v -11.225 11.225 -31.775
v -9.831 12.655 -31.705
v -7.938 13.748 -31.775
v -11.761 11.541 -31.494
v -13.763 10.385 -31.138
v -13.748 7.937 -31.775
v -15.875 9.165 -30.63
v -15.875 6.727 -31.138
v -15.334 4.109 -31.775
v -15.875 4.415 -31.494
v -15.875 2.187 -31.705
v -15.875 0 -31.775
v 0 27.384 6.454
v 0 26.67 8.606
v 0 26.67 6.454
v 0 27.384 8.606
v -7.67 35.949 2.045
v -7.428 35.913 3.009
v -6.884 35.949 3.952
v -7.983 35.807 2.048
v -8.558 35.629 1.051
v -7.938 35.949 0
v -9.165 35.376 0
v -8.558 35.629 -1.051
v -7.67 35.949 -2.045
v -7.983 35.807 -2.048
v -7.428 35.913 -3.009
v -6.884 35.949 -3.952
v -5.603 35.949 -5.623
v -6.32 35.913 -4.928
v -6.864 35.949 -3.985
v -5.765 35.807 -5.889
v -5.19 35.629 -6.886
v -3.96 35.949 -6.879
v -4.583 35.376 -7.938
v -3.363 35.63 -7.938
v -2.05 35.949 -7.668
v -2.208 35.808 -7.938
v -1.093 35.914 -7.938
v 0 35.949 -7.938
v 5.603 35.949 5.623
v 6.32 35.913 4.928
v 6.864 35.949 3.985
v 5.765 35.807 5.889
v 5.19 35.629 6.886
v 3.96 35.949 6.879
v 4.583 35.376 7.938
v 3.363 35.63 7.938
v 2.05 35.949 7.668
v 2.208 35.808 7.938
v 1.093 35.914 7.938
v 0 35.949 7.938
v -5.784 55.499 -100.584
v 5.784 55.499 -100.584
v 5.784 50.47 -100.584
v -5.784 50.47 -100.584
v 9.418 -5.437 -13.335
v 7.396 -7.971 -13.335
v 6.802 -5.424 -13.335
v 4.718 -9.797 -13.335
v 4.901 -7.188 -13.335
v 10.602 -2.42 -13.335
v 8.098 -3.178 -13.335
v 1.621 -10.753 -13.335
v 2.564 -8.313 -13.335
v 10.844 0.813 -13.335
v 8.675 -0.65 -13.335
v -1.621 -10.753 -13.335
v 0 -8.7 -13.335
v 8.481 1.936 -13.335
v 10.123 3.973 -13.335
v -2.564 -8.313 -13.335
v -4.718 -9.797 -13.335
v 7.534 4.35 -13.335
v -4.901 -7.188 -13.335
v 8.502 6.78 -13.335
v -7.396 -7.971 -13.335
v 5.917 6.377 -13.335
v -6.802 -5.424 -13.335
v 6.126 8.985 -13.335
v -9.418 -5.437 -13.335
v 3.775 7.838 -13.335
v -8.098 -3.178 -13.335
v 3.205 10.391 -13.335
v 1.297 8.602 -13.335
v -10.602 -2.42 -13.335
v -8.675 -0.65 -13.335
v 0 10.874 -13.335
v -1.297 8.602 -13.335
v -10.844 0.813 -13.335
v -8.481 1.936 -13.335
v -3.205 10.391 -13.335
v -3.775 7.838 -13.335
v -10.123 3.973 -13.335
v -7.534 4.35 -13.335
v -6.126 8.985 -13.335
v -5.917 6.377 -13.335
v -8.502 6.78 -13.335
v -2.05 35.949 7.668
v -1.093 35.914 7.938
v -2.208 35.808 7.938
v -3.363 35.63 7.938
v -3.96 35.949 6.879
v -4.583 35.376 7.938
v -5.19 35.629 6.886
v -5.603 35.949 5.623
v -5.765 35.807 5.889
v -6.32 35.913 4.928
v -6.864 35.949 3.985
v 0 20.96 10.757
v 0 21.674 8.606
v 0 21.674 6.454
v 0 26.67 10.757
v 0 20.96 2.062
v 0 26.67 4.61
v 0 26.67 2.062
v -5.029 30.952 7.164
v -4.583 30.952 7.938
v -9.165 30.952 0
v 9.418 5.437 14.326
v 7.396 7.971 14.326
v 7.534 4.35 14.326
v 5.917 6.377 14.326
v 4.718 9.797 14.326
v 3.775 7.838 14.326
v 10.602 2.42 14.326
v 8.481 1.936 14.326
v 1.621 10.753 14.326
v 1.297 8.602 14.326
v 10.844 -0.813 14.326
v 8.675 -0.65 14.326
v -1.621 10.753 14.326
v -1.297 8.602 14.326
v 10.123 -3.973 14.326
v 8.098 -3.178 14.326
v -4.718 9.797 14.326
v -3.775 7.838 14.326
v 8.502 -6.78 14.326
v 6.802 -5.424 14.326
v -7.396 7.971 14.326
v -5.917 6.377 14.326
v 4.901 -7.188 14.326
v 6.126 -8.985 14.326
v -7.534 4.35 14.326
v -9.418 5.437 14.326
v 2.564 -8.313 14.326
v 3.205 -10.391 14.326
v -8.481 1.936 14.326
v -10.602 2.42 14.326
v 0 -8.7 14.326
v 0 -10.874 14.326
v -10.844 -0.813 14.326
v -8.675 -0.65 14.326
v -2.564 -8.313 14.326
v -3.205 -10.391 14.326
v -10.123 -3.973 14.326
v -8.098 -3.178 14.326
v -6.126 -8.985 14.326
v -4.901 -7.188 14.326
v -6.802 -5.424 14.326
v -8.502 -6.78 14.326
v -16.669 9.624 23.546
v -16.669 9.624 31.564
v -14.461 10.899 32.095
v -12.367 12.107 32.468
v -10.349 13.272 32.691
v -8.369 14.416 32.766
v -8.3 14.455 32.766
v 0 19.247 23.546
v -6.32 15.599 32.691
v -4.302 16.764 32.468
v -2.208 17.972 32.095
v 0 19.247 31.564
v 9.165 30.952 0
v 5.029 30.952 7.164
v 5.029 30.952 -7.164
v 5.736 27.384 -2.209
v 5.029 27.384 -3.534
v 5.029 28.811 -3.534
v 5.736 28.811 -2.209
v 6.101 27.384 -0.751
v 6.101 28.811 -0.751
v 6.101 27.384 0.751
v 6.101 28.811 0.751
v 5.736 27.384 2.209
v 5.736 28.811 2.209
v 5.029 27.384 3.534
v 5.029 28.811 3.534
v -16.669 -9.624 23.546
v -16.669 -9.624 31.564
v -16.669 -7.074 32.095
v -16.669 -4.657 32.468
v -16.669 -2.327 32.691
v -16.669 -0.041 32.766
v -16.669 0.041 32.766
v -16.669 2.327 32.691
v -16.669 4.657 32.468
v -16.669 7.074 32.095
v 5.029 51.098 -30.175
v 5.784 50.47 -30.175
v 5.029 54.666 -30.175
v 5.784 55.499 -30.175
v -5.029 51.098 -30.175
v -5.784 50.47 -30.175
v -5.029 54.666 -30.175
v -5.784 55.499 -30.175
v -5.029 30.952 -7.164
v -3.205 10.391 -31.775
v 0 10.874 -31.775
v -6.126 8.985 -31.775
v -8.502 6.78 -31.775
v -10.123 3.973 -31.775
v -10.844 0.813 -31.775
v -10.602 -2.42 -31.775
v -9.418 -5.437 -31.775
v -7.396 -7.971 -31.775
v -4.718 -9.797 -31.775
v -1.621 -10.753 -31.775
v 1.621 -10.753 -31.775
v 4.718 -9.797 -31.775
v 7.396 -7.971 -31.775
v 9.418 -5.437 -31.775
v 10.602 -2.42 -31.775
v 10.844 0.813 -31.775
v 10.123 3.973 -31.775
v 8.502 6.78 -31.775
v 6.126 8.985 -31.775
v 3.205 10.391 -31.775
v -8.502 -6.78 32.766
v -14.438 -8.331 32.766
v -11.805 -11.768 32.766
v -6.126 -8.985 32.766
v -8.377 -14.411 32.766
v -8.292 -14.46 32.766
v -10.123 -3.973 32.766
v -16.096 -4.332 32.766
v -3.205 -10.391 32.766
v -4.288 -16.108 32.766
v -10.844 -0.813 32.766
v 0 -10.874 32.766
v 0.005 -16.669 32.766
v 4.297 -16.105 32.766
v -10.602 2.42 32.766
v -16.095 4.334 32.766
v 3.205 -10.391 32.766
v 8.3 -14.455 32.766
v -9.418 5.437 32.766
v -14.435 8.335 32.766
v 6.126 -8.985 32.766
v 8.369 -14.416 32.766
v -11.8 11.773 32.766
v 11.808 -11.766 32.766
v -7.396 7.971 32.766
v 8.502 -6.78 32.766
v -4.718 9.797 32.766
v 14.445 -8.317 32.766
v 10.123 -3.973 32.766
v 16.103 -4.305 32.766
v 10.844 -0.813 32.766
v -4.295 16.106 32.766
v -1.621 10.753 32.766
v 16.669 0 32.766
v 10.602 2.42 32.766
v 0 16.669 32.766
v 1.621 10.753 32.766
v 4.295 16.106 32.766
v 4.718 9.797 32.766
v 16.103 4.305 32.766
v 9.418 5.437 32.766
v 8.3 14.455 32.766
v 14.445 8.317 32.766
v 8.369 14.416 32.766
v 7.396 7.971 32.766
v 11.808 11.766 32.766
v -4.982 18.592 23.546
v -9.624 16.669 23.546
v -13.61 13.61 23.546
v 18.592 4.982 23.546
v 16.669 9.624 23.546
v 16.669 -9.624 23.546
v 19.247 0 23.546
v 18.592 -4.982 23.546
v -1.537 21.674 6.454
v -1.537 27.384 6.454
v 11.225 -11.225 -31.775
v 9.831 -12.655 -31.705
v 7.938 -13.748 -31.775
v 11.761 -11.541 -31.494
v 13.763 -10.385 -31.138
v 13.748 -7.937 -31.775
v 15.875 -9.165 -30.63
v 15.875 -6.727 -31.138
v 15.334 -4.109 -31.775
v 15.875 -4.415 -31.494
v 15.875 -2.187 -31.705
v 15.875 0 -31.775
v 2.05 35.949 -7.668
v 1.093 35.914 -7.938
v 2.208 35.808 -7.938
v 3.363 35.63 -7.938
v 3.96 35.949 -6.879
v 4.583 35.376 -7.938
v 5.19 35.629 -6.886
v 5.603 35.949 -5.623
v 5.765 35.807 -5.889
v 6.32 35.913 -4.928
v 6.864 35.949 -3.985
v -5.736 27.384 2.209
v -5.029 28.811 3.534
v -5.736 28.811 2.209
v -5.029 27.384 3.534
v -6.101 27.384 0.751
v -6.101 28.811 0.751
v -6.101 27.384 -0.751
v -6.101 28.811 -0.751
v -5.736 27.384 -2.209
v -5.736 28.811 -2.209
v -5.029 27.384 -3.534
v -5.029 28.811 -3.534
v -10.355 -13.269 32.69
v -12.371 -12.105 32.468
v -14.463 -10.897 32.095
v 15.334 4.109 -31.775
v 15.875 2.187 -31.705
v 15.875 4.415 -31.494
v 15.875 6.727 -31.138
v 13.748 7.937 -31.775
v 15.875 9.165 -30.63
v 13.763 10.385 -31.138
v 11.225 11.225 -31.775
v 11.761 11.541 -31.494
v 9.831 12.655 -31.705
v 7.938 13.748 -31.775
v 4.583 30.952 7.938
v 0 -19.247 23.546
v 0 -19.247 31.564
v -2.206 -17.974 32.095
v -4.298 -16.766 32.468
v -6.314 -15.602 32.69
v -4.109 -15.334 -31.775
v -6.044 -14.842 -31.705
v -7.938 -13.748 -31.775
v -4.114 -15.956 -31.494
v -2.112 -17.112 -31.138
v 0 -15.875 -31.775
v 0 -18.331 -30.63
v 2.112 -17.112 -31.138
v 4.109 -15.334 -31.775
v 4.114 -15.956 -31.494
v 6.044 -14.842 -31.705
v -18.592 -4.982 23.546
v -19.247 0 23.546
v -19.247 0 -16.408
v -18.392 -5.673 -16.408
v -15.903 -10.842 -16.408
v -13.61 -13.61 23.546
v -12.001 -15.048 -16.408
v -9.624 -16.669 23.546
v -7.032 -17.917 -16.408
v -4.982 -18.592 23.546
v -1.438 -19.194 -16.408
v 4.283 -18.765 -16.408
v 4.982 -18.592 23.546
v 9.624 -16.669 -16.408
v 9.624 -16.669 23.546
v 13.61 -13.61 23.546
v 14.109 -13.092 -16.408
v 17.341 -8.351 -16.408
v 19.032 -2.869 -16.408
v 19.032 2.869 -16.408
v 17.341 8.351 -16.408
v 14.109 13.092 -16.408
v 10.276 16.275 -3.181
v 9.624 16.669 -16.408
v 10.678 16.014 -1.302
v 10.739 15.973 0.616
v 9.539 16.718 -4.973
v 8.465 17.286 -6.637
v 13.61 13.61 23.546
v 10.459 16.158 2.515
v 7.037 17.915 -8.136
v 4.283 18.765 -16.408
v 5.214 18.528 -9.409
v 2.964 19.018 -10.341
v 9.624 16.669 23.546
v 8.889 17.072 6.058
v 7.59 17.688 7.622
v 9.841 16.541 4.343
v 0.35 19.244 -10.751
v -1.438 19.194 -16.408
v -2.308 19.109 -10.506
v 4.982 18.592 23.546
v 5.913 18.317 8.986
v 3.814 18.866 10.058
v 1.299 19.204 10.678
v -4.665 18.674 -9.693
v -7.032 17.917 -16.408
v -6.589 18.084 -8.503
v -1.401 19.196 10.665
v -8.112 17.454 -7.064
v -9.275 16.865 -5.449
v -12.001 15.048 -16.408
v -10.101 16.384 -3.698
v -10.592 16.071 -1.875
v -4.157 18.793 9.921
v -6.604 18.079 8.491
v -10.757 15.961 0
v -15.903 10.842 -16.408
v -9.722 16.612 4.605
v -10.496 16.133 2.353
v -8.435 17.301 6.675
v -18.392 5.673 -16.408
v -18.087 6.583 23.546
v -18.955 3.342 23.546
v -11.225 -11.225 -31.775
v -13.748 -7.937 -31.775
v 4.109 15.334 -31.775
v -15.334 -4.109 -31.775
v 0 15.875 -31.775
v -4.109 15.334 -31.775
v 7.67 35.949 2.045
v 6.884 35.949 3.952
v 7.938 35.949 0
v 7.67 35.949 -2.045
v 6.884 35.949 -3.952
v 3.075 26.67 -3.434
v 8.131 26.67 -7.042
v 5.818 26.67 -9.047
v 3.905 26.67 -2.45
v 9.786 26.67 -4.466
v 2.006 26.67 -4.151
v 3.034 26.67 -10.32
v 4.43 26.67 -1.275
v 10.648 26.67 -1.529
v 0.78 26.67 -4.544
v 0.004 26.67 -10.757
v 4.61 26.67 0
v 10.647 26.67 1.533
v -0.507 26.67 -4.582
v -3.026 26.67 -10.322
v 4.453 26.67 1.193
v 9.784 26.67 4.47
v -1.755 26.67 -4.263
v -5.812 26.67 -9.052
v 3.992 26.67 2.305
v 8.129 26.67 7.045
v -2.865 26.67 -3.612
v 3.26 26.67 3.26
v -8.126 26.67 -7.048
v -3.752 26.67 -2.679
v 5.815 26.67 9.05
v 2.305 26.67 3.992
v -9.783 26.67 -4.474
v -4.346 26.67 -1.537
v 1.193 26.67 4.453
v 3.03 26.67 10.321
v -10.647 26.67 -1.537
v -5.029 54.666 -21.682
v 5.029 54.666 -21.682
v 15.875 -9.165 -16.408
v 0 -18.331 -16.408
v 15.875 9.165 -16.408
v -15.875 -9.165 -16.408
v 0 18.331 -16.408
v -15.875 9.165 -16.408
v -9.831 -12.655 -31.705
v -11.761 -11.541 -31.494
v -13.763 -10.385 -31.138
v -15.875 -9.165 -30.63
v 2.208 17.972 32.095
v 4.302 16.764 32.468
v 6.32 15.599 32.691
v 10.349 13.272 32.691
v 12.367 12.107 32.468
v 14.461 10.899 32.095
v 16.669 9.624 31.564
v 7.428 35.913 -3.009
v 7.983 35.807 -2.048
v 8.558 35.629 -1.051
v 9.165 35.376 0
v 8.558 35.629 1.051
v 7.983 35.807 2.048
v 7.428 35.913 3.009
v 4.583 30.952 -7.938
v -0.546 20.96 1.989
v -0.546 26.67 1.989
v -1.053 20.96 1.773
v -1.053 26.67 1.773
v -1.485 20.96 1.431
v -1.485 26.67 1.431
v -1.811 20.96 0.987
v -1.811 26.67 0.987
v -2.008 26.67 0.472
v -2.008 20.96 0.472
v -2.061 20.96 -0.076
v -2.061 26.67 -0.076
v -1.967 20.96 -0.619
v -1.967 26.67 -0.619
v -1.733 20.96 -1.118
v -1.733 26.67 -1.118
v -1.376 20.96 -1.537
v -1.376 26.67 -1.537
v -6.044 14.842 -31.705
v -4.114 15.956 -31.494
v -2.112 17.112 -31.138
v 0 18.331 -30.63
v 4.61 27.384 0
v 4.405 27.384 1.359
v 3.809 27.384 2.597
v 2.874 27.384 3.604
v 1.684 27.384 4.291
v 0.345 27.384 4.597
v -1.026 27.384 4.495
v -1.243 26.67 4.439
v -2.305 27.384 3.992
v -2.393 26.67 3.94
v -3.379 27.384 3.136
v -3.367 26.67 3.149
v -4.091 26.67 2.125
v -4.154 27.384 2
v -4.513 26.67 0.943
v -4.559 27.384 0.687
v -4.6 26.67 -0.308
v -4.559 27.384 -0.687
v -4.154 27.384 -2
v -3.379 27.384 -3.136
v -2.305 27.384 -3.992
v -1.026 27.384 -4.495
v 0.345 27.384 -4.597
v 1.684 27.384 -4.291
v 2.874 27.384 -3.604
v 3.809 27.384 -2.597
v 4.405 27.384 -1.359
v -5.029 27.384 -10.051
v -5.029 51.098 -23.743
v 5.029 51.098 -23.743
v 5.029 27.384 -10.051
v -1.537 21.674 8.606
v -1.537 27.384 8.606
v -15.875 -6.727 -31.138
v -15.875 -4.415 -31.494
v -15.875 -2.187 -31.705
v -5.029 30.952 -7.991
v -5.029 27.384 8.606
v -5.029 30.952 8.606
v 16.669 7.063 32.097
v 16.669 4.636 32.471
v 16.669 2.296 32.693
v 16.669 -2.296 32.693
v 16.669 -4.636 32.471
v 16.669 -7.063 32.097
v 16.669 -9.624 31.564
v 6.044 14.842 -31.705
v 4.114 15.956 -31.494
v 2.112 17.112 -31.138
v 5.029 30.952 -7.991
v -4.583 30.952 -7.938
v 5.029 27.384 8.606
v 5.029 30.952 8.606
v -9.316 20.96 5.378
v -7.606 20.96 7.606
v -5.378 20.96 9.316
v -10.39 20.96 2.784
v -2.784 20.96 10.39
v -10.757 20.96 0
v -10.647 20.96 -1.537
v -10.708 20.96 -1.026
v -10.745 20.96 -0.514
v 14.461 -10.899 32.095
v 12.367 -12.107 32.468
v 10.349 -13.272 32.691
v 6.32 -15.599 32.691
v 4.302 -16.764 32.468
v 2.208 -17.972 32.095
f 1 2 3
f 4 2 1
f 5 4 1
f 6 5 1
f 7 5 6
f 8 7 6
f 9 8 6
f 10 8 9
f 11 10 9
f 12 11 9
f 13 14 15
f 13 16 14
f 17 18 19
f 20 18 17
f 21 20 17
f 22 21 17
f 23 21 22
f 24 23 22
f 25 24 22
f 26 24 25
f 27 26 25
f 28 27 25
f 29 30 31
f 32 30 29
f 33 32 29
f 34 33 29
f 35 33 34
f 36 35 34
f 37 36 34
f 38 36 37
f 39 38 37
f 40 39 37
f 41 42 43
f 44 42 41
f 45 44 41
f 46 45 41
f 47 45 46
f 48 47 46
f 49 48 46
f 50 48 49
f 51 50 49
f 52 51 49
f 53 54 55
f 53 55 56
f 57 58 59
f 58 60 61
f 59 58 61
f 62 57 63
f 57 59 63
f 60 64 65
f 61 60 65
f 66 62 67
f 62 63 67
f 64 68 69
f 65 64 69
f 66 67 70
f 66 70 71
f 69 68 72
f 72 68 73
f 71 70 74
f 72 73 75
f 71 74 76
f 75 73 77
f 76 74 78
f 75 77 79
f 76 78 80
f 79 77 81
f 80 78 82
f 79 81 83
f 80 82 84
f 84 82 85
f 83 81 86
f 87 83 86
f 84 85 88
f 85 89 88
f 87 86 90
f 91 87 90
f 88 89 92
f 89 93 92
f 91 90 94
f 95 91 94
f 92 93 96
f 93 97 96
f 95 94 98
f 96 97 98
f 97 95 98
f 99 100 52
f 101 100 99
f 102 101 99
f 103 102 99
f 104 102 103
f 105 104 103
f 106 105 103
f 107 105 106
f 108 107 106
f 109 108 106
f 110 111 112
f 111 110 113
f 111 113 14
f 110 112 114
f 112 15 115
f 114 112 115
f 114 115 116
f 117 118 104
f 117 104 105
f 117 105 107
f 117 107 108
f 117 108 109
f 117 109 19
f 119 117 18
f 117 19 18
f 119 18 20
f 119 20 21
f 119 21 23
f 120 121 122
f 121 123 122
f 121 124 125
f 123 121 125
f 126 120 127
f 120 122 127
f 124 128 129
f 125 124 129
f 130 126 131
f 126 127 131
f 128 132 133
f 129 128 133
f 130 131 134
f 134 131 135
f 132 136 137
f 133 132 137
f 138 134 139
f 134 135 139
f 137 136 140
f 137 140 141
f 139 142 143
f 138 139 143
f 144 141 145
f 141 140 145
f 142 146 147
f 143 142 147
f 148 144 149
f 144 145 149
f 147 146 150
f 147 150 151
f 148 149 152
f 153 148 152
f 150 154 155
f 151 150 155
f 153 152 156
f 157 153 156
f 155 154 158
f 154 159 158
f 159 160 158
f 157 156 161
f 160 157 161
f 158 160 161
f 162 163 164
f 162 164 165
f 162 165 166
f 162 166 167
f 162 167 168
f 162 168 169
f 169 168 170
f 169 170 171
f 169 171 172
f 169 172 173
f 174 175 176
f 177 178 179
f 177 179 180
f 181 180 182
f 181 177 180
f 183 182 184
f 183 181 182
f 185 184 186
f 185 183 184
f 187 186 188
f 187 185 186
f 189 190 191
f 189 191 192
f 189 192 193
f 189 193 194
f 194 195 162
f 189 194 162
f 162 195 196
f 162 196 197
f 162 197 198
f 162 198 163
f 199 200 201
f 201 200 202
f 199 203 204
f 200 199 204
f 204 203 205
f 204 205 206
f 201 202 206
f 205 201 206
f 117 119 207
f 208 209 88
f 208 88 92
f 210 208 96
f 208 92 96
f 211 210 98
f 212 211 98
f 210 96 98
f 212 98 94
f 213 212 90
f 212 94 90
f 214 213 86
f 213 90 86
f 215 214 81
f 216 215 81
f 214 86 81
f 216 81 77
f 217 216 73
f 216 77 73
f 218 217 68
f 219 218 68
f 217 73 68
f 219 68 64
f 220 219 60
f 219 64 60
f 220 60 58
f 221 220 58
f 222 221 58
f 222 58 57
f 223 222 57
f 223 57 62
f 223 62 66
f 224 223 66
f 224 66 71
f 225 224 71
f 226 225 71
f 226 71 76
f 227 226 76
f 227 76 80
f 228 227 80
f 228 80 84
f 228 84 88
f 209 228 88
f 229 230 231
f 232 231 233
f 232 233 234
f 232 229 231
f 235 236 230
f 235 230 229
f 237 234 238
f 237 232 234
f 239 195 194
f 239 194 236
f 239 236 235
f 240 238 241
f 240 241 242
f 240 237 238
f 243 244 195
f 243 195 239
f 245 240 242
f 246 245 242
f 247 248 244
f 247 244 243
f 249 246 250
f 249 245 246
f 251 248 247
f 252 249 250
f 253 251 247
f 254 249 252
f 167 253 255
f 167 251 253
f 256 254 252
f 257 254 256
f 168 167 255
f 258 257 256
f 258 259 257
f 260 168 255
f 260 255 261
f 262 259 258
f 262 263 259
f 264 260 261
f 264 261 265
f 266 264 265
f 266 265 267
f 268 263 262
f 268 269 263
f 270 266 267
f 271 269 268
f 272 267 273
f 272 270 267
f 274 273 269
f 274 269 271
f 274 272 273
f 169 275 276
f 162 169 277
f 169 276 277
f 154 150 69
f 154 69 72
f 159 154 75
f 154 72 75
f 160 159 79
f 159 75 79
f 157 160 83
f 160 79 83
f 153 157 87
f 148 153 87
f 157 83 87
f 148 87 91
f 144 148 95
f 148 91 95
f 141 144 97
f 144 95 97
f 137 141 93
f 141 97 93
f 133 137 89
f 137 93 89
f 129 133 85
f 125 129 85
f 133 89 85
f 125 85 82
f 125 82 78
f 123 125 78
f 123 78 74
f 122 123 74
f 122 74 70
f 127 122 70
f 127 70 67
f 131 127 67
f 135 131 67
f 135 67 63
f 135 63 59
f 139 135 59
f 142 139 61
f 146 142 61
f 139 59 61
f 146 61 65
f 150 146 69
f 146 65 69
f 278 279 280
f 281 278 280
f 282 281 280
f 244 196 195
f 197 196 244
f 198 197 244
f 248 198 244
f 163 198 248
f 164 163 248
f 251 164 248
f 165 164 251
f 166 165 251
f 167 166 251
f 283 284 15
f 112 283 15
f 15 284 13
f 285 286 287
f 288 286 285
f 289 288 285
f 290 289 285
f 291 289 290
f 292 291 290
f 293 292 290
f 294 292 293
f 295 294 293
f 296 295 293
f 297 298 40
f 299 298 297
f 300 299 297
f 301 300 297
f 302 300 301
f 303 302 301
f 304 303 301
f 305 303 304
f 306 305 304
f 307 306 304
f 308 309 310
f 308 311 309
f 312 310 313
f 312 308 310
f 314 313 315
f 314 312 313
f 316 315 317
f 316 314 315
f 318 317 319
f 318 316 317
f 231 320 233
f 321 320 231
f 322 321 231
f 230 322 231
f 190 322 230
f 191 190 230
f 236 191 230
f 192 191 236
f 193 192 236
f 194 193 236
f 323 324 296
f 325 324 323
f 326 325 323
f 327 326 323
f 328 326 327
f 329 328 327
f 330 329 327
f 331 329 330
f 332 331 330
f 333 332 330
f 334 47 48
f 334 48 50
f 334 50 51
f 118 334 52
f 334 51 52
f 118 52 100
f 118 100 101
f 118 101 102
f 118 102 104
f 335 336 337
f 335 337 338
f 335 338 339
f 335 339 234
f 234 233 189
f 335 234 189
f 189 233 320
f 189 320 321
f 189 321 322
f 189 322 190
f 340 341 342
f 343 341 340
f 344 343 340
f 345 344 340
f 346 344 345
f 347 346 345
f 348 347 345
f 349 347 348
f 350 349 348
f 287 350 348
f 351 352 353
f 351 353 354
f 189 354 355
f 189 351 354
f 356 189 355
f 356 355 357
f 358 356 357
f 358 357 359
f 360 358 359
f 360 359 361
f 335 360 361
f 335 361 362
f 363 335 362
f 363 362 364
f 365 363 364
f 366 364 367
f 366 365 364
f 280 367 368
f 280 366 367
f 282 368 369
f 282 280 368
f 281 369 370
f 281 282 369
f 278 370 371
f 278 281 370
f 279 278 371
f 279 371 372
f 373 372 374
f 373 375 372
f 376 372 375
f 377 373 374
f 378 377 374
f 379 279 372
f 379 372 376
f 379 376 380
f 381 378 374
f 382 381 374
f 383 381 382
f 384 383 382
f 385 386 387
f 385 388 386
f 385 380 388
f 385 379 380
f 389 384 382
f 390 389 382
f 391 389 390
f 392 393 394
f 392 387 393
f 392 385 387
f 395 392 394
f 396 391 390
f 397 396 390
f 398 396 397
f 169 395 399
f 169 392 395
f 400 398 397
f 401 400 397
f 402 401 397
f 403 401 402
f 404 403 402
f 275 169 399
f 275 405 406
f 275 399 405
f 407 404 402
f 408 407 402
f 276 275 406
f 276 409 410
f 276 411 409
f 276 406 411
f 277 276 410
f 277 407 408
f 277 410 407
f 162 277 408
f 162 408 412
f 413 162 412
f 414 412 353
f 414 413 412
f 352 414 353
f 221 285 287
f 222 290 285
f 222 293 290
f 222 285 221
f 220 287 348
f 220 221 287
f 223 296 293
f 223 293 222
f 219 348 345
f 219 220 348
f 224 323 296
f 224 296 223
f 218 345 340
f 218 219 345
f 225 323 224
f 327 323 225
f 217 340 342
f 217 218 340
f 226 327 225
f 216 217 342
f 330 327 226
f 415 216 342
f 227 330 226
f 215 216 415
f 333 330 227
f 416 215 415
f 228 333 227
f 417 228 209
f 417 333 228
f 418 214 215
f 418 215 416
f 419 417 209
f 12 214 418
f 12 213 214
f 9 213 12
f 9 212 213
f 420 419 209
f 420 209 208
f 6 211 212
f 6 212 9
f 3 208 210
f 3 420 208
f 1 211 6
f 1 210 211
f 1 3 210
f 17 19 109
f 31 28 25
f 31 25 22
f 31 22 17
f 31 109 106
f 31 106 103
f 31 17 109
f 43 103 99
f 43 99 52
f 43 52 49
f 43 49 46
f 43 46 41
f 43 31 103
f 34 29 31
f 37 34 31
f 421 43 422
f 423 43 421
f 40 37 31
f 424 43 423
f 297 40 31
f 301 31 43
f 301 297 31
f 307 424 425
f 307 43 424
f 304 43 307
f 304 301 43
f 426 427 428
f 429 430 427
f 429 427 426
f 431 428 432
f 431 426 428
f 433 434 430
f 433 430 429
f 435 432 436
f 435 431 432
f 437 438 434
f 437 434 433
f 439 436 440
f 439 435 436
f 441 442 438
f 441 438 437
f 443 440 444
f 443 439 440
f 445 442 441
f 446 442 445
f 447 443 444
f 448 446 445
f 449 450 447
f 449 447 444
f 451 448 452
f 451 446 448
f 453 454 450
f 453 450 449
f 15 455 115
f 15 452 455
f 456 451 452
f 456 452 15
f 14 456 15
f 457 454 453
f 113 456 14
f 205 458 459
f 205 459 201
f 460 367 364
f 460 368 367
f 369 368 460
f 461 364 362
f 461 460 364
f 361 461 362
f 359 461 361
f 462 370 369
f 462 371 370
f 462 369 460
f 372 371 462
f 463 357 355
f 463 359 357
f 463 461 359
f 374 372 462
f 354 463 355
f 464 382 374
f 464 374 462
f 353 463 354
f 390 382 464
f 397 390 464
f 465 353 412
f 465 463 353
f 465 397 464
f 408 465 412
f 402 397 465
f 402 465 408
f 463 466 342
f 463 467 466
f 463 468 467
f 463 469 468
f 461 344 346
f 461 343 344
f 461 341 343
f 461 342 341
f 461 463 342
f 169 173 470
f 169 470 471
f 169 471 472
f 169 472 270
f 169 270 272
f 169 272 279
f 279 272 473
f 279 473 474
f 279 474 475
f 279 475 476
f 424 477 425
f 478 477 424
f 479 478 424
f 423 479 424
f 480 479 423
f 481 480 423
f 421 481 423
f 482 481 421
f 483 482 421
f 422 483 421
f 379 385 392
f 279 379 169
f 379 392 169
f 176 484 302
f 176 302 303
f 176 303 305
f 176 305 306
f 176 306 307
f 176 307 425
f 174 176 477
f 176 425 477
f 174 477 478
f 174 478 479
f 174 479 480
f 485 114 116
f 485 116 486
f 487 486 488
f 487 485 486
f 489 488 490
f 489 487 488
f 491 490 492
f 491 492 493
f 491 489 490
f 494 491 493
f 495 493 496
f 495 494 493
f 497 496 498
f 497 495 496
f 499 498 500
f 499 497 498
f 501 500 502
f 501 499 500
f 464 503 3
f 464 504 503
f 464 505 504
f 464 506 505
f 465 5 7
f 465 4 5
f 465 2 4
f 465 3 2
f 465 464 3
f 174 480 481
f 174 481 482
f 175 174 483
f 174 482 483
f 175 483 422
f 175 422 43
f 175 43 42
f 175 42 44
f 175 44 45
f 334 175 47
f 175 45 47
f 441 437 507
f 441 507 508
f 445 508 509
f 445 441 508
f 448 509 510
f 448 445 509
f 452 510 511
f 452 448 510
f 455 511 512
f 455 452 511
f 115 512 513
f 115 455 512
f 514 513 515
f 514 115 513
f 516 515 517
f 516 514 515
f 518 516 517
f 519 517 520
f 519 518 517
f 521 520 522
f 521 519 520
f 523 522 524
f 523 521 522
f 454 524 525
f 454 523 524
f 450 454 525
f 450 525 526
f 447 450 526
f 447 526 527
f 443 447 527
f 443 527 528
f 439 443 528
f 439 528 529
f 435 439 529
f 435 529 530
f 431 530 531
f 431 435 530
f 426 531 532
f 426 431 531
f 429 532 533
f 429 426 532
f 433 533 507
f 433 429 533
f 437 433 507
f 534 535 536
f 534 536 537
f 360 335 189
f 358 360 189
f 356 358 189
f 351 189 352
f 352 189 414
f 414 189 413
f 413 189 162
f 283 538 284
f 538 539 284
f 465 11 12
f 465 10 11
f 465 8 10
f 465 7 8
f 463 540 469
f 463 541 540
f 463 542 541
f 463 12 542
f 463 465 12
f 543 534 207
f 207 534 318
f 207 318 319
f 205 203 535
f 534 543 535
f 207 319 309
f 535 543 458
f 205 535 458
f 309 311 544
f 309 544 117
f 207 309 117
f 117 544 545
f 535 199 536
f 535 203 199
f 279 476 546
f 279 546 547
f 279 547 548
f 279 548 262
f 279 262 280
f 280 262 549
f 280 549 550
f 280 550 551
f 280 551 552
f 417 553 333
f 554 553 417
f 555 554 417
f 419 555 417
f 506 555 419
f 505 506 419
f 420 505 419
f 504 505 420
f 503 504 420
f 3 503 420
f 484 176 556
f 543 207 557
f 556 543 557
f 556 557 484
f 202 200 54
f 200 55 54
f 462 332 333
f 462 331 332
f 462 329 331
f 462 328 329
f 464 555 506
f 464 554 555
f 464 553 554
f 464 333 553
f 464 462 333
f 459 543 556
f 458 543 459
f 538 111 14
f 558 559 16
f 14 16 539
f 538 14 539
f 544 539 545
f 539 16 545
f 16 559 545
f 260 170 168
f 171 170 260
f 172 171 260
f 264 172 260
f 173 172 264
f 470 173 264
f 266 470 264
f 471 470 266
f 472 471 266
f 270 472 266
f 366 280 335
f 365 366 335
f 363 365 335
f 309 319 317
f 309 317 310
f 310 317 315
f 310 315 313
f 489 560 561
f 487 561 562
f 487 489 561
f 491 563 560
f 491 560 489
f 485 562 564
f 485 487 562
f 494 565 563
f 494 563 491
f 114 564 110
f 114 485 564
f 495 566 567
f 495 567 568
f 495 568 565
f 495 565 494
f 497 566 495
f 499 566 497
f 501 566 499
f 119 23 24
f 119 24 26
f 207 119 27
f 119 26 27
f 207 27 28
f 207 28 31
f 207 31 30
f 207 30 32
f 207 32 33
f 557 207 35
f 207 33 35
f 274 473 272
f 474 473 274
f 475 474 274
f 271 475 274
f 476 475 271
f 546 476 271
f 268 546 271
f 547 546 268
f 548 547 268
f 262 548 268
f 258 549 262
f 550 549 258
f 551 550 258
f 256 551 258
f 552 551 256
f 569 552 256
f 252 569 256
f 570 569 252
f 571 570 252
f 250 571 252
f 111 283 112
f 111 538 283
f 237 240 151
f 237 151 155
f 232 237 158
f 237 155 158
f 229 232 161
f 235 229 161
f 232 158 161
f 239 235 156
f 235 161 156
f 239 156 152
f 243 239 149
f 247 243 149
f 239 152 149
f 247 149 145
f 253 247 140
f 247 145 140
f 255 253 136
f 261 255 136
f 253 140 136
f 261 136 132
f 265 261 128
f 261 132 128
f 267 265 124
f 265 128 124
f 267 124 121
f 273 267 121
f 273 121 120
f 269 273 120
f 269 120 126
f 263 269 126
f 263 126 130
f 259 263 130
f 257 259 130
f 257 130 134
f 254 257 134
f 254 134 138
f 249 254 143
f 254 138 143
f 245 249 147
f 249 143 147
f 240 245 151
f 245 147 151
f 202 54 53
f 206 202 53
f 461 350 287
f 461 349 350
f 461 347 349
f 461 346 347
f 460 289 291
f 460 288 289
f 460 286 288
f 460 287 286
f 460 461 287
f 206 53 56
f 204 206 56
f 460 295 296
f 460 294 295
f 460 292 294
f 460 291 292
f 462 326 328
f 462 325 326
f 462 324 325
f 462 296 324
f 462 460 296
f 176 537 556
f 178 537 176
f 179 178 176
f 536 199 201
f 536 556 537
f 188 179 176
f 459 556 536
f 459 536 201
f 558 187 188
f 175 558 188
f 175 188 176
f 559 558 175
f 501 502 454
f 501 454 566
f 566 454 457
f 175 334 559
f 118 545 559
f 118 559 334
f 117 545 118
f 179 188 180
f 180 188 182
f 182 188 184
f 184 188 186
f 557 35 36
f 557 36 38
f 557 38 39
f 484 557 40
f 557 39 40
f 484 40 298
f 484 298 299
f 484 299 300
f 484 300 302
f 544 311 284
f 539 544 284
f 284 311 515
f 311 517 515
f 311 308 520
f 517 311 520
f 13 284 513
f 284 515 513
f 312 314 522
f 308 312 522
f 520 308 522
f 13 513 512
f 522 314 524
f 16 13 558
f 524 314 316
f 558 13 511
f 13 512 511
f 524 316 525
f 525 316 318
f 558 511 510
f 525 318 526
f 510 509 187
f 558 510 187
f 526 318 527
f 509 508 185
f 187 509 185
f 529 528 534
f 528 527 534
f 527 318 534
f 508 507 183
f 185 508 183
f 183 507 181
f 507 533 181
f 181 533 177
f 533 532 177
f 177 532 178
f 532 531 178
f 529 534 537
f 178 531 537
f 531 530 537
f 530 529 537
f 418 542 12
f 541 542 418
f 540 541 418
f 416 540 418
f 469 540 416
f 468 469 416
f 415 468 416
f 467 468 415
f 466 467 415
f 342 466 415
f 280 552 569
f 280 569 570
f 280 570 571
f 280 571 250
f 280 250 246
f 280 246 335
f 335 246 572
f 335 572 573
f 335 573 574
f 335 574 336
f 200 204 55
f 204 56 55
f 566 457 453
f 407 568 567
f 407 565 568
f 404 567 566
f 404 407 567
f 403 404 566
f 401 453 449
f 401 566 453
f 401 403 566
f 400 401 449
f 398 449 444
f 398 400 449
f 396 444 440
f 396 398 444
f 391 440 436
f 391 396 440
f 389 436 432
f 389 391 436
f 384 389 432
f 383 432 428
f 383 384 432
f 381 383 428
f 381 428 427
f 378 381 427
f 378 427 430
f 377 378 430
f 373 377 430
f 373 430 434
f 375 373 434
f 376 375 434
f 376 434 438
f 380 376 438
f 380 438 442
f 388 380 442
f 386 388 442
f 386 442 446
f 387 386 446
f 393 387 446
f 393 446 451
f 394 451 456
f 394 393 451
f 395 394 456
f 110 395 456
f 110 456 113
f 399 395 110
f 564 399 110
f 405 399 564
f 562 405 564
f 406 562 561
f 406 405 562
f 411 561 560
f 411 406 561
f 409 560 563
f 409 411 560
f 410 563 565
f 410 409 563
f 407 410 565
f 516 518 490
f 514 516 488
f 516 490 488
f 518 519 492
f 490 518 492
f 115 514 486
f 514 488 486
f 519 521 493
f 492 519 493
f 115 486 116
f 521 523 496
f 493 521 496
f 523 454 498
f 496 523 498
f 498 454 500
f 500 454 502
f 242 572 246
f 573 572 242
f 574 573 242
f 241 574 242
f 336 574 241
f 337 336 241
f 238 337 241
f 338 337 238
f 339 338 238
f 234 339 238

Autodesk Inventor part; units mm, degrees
sketch "Sketch3" plane through (0, 0, 0) normal (0, 1, 0) x (-1, 0, 0)
  circle A0 centre (0, 0) radius 10.7569
  dimension "d16" = 21.5138
extrude "Extrusion3" add sketch "Sketch3" along normal blind 26.67
sketch "Sketch4" plane through (0, 26.67, 0) normal (0, 1, 0) x (1, 0, 0)
  circle A0 centre (0, 0) radius 10.7569 projected
  circle A1 centre (0, 0) radius 4.6101
  dimension "d19" = 9.2202
extrude "Extrusion4" add sketch "Sketch4" along normal blind 0.7137 contours A1
sketch "Sketch5" plane through (0, 27.3837, 0) normal (0, 1, 0) x (1, 0, 0)
  circle A0 centre (0, 0) radius 4.6101 projected
  circle A1 centre (0, 0) radius 6.1468
  dimension "d22" = 12.2936
extrude "Extrusion5" add sketch "Sketch5" along normal blind 1.4275 contours A0 | A1
sketch "Sketch6" plane through (0, 28.8112, 0) normal (0, 1, 0) x (1, 0, 0)
  circle A0 centre (0, 0) radius 6.1468 projected
  circle A1 centre (0, 0) radius 2.4587
  dimension "d25" = 4.9174
extrude "Extrusion6" add sketch "Sketch6" along normal mid plane 14.2748 contours A1
sketch "Sketch7" plane through (0, 35.9486, 0) normal (0, 1, 0) x (1, 0, 0)
  circle A0 centre (0, 0) radius 2.4587 projected
  line L0 (9.1654, 0) -> (4.5827, -7.9375)
  line L1 (4.5827, -7.9375) -> (-4.5827, -7.9375)
  line L2 (-4.5827, -7.9375) -> (-9.1654, 0)
  line L3 (-9.1654, 0) -> (-4.5827, 7.9375)
  line L4 (-4.5827, 7.9375) -> (4.5827, 7.9375)
  line L5 (4.5827, 7.9375) -> (9.1654, 0)
  dimension "d28" = 15.875
extrude "Extrusion7" add sketch "Sketch7" against normal blind 4.9962 contours A0 | L0 L1 L2 L3 L4 L5
sketch "Sketch8" plane through (0, 0, 0) normal (1, 0, 0) x (0, 1, 0)
  line L0 (30.9524, 7.9375) -> (30.9524, 0) projected
  line L1 (30.9524, 8.6055) -> (30.9524, -7.9908)
  line L2 (30.9524, -7.9908) -> (54.6665, -21.6822)
  line L3 (54.6665, -21.6822) -> (54.6665, -100.584)
  line L4 (51.0978, -100.584) -> (51.0978, -23.7426)
  line L5 (51.0978, -23.7426) -> (27.3837, -10.0512)
  line L6 (27.3837, -10.0512) -> (27.3837, 8.6055)
  line L7 (54.6665, -100.584) -> (51.0978, -100.584)
  line L8 (30.9524, 8.6055) -> (27.3837, 8.6055)
  line L9 (35.9486, 0) -> (30.9524, 0) projected
  line L10 (0, 10.7569) -> (0, -10.7569) projected
  dimension "d31" = 3.5687
  dimension "d32" = 8.6055
  dimension "d33" = 120
  dimension "d34" = 100.584
  dimension "d36" = 7.9908
  dimension "d54" = 54.6665
extrude "Extrusion8" add sketch "Sketch8" along normal mid plane 10.0584
sketch "Sketch9" plane through (0, 26.67, 0) normal (0, 1, 0) x (1, 0, 0)
  circle A0 centre (0, 0) radius 10.7569 projected
  line L0 (0, -10.7569) -> (0, 1.5367)
  line L1 (0, 1.5367) -> (-10.6466, 1.5367)
  circle A1 centre (0, 0) radius 4.6101 projected
  dimension "d73" = 12.2936
extrude "Extrusion9" cut sketch "Sketch9" against normal blind 5.7099 contours L1 A1 L0 A0 | L1 L0 A1 picked at (-1.2328, -8.5574) picked at (-0.3635, -2.5175)
ref_plane "Work Plane2" through (0, 0, -24.5872) normal (0, 0, 1) x (1, 0, 0)
sketch "Sketch15" plane through (-5.0292, 27.3837, 8.6055) normal (0, -1, 0) x (1, 0, 0)
  line L0 (10.0584, 0) -> (0, 0) projected
  line L1 (5.0292, 0) -> (3.4925, 0)
  line L2 (3.4925, 0) -> (3.4925, -2.1514)
  line L3 (3.4925, -2.1514) -> (5.0292, -2.1514)
  line L4 (5.0292, 0) -> (5.0292, -2.1514)
  line L5 (5.0292, -131.4577) -> (5.0292, 24.4196) projected
  dimension "d63" = 2.1514
  dimension "d74" = 1.5367
extrude "Extrusion15" add sketch "Sketch15" along normal blind 5.7099
sketch "Sketch16" plane through (0, 0, 0) normal (0, 1, 0) x (-1, 0, 0)
  circle A0 centre (0, 0) radius 2.0625 projected
extrude "Extrusion16" add sketch "Sketch16" along normal blind 28.5496
sketch "Sketch20" plane through (0, 0, 0) normal (1, 0, 0) x (0, 1, 0)
  line L0 (35.9486, 7.9375) -> (30.9524, 7.9375) projected
  line L1 (35.9486, 7.9375) -> (35.9486, 9.365)
  line L2 (35.9486, 9.365) -> (35.283, 9.365)
  line L3 (35.283, 9.365) -> (35.9486, 7.9375)
  line L4 (-7.1897, 0) -> (43.1383, 0) projected
  dimension "d94" = 1.4275
  dimension "d95" = 25
ref_plane "Work Plane5" through (4.5827, 33.4505, 7.9375) normal (0, 1, 0) x (0.5, 0, -0.866)
revolve "Revolution3" cut sketch "Sketch20" angle 360 about axis through (0, -10, 0) along (0, 1, 0)
ref_plane "Work Plane6" through (0, 0, 32.766) normal (0, 0, 1) x (1, 0, 0)
ref_plane "Work Plane9" through (0, 0, 32.766) normal (0, 0, 1) x (1, 0, 0)
sketch "Sketch29" plane through (0, 0, 32.766) normal (0, 0, 1) x (1, 0, 0)
  line L0 (0, 19.2474) -> (16.6688, 9.6237)
  line L1 (16.6688, 9.6237) -> (16.6688, -9.6237)
  line L2 (16.6688, -9.6237) -> (0, -19.2474)
  line L3 (0, -19.2474) -> (-16.6687, -9.6237)
  line L4 (-16.6687, -9.6237) -> (-16.6688, 9.6237)
  line L5 (-16.6688, 9.6237) -> (0, 19.2474)
  point P0 (0, 0)
  point P1 (0, 0)
  point P2 (16.6687, 0)
  dimension "d140" = 33.3375
extrude "Extrusion23" add sketch "Sketch29" against normal blind 9.2202
sketch "Sketch30" plane through (0, 0, 23.5458) normal (0, 0, -1) x (-1, 0, 0)
  line L0 (16.6688, 9.6237) -> (16.6687, -9.6237) projected
  line L1 (0, 19.2474) -> (0, -19.2474)
  circle A0 centre (0, 0) radius 19.2474
extrude "Extrusion24" add sketch "Sketch30" along normal blind 39.9542
sketch "Sketch31" plane through (0, 0, -16.4084) normal (0, 0, -1) x (-1, 0, 0)
  circle A0 centre (0, 0) radius 19.2474 projected
  line L0 (0, 18.3309) -> (15.875, 9.1654)
  line L1 (15.875, 9.1654) -> (15.875, -9.1654)
  line L2 (15.875, -9.1654) -> (0, -18.3309)
  line L3 (0, -18.3309) -> (-15.875, -9.1654)
  line L4 (-15.875, -9.1654) -> (-15.875, 9.1654)
  line L5 (-15.875, 9.1654) -> (0, 18.3309)
  point P0 (-15.875, 0)
  dimension "d145" = 31.75
extrude "Extrusion25" add sketch "Sketch31" along normal blind 15.367 contours L0 L1 L2 L3 L4 L5
hole "Hole4" at (0, 0, 32.766) direction (0, 0, -1) diameter 21.7488 depth 18.4404
hole "Hole5" at (0, 0, -31.7754) direction (0, 0, 1) diameter 21.7488 depth 18.4404
hole "Hole6" at (0, 0, 14.3256) direction (0, 0, -1) diameter 17.399 end through all
sketch "Sketch32" plane through (0, 0, 0) normal (0, 1, 0) x (-1, 0, 0)
  line L0 (16.6688, 32.766) -> (0, 32.766) projected
  line L1 (16.6688, 32.766) -> (24.6063, 32.766)
  line L2 (24.6063, 32.766) -> (24.6063, 29.0647)
  line L3 (24.6063, 29.0647) -> (16.6688, 32.766)
  line L4 (0, -6.5532) -> (0, 39.3192) projected
  dimension "d157" = 25
  dimension "d158" = 7.9375
revolve "Revolution6" cut sketch "Sketch32" angle 360 about axis through (0, 0, -10) along (0, 0, 1)
sketch "Sketch33" plane through (0, 0, 0) normal (0, 1, 0) x (-1, 0, 0)
  line L0 (0, -31.7754) -> (15.875, -31.7754) projected
  line L1 (15.875, -31.7754) -> (0, -31.7754) projected
  line L2 (0, -16.4084) -> (0, -31.7754) projected
  line L3 (15.875, -16.4084) -> (15.875, -31.7754) projected
  line L4 (15.875, -31.7754) -> (23.8125, -31.7754)
  line L5 (23.8125, -31.7754) -> (23.8125, -28.0741)
  line L6 (23.8125, -28.0741) -> (15.875, -31.7754)
  line L7 (0, -38.1305) -> (0, 6.3551) projected
  line L8 (15.875, -16.4084) -> (0, -16.4084) projected
  point P0 (0, -17.3736)
  dimension "d160" = 25
  dimension "d161" = 7.9375
revolve "Revolution7" cut sketch "Sketch33" angle 360 about axis through (0, 0, -10) along (0, 0, 1) contours L6 L5 L4
sketch "Sketch34" plane through (5.0292, 51.0978, -100.584) normal (0, 0, -1) x (-1, 0, 0)
  line L0 (0, 3.5687) -> (0, 0) projected
  line L1 (0, 3.5687) -> (10.0584, 3.5687) projected
  line L2 (-0.7544, 4.4012) -> (10.8128, 4.4012)
  line L3 (10.8128, 4.4012) -> (10.8128, -0.628)
  line L4 (10.8128, -0.628) -> (-0.7544, -0.628)
  line L5 (-0.7544, -0.628) -> (-0.7544, 4.4012)
  point P0 (0, 1.7843)
  point P1 (-0.7544, 1.8866)
  point P2 (5.0292, 3.5687)
  point P3 (5.0292, 4.4012)
  point P4 (5.0292, -51.0978)
  dimension "d163" = 11.5672
  dimension "d164" = 5.0292
  dimension "d165" = 55.499
extrude "Extrusion26" add sketch "Sketch34" against normal blind 70.4088
thread "Thread4" size "3/4" designation "3/4 - 14 NPT" standard "NPT for PVC Pipe and Fitting" length 12.2936
thread "Thread5" size "3/4" designation "3/4 - 14 NPT" standard "NPT for PVC Pipe and Fitting" length 12.2936
equation "\"d16\" = 0.35 * M"
equation "\"d17\" = 0.8 * C_HEX"
equation "\"d19\" = 0.15 * M"
equation "\"d20\" = 0.01 * N1"
equation "\"d22\" = 0.2 * M"
equation "\"d23\" = 0.02 * N1"
equation "\"d25\" = 0.08 * M"
equation "\"d26\" = 0.2 * N1"
equation "\"d28\" = 0.5 * B_HEX"
equation "\"d29\" = 0.07 * N1"
equation "\"d31\" = 0.05 * N1"
equation "\"d32\" = 0.14 * M"
equation "\"d34\" = H1"
equation "\"d36\" = 0.13 * M"
equation "\"d54\" = -0.4925 * B_HEX + 0.985 * N1"
equation "\"d37\" = 0.1 * H1"
equation "\"d73\" = 0.2 * M"
equation "\"d39\" = 0.08 * N1"
equation "\"d63\" = 0.035 * M"
equation "\"d74\" = 0.025 * M"
equation "\"d64\" = 0.08 * N1"
equation "\"d75\" = 0.4 * N1"
equation "\"d94\" = 0.02 * N1"
equation "\"d140\" = C_HEX"
equation "\"d141\" = 0.15 * M"
equation "\"d143\" = 0.65 * M"
equation "\"d145\" = B_HEX"
equation "\"d146\" = 0.25 * M"
equation "\"d150\" = 1.25 * D"
equation "\"d155\" = 0.3 * M"
equation "\"d178\" = d150"
equation "\"d183\" = 0.3 * M"
equation "\"d187\" = D"
equation "\"d192\" = 0.3 * M"
equation "\"d158\" = 0.25 * B_HEX"
equation "\"d161\" = 0.25 * B_HEX"
equation "\"d163\" = 0.115 * H1"
equation "\"d164\" = 0.05 * H1"
equation "\"d165\" = N1 - 0.5 * B_HEX"
equation "\"d166\" = 0.7 * H1"
equation "\"d170\" = 0.2 * M"
equation "\"d172\" = 0.2 * M"
equation "\"D\" = 17.399"
equation "\"N1\" = 71.374"
equation "\"M\" = 61.468"
equation "\"H1\" = 100.584"
equation "\"L\" = 133.35"
equation "\"B_HEX\" = 31.75"
equation "\"C_HEX\" = 33.3375"
equation "\"d41\" = -0.4 * M"
equation "\"d104\" = L - H1"
equation "\"d139\" = L - H1"
equation "\"P_TH\" = 6.35"
equation "\"Parker_No\" = 1.2345"
properties part number "Parker Female-Female Pipe Ends XV500P XV500P-12" material "Brass, Soft Yellow"
